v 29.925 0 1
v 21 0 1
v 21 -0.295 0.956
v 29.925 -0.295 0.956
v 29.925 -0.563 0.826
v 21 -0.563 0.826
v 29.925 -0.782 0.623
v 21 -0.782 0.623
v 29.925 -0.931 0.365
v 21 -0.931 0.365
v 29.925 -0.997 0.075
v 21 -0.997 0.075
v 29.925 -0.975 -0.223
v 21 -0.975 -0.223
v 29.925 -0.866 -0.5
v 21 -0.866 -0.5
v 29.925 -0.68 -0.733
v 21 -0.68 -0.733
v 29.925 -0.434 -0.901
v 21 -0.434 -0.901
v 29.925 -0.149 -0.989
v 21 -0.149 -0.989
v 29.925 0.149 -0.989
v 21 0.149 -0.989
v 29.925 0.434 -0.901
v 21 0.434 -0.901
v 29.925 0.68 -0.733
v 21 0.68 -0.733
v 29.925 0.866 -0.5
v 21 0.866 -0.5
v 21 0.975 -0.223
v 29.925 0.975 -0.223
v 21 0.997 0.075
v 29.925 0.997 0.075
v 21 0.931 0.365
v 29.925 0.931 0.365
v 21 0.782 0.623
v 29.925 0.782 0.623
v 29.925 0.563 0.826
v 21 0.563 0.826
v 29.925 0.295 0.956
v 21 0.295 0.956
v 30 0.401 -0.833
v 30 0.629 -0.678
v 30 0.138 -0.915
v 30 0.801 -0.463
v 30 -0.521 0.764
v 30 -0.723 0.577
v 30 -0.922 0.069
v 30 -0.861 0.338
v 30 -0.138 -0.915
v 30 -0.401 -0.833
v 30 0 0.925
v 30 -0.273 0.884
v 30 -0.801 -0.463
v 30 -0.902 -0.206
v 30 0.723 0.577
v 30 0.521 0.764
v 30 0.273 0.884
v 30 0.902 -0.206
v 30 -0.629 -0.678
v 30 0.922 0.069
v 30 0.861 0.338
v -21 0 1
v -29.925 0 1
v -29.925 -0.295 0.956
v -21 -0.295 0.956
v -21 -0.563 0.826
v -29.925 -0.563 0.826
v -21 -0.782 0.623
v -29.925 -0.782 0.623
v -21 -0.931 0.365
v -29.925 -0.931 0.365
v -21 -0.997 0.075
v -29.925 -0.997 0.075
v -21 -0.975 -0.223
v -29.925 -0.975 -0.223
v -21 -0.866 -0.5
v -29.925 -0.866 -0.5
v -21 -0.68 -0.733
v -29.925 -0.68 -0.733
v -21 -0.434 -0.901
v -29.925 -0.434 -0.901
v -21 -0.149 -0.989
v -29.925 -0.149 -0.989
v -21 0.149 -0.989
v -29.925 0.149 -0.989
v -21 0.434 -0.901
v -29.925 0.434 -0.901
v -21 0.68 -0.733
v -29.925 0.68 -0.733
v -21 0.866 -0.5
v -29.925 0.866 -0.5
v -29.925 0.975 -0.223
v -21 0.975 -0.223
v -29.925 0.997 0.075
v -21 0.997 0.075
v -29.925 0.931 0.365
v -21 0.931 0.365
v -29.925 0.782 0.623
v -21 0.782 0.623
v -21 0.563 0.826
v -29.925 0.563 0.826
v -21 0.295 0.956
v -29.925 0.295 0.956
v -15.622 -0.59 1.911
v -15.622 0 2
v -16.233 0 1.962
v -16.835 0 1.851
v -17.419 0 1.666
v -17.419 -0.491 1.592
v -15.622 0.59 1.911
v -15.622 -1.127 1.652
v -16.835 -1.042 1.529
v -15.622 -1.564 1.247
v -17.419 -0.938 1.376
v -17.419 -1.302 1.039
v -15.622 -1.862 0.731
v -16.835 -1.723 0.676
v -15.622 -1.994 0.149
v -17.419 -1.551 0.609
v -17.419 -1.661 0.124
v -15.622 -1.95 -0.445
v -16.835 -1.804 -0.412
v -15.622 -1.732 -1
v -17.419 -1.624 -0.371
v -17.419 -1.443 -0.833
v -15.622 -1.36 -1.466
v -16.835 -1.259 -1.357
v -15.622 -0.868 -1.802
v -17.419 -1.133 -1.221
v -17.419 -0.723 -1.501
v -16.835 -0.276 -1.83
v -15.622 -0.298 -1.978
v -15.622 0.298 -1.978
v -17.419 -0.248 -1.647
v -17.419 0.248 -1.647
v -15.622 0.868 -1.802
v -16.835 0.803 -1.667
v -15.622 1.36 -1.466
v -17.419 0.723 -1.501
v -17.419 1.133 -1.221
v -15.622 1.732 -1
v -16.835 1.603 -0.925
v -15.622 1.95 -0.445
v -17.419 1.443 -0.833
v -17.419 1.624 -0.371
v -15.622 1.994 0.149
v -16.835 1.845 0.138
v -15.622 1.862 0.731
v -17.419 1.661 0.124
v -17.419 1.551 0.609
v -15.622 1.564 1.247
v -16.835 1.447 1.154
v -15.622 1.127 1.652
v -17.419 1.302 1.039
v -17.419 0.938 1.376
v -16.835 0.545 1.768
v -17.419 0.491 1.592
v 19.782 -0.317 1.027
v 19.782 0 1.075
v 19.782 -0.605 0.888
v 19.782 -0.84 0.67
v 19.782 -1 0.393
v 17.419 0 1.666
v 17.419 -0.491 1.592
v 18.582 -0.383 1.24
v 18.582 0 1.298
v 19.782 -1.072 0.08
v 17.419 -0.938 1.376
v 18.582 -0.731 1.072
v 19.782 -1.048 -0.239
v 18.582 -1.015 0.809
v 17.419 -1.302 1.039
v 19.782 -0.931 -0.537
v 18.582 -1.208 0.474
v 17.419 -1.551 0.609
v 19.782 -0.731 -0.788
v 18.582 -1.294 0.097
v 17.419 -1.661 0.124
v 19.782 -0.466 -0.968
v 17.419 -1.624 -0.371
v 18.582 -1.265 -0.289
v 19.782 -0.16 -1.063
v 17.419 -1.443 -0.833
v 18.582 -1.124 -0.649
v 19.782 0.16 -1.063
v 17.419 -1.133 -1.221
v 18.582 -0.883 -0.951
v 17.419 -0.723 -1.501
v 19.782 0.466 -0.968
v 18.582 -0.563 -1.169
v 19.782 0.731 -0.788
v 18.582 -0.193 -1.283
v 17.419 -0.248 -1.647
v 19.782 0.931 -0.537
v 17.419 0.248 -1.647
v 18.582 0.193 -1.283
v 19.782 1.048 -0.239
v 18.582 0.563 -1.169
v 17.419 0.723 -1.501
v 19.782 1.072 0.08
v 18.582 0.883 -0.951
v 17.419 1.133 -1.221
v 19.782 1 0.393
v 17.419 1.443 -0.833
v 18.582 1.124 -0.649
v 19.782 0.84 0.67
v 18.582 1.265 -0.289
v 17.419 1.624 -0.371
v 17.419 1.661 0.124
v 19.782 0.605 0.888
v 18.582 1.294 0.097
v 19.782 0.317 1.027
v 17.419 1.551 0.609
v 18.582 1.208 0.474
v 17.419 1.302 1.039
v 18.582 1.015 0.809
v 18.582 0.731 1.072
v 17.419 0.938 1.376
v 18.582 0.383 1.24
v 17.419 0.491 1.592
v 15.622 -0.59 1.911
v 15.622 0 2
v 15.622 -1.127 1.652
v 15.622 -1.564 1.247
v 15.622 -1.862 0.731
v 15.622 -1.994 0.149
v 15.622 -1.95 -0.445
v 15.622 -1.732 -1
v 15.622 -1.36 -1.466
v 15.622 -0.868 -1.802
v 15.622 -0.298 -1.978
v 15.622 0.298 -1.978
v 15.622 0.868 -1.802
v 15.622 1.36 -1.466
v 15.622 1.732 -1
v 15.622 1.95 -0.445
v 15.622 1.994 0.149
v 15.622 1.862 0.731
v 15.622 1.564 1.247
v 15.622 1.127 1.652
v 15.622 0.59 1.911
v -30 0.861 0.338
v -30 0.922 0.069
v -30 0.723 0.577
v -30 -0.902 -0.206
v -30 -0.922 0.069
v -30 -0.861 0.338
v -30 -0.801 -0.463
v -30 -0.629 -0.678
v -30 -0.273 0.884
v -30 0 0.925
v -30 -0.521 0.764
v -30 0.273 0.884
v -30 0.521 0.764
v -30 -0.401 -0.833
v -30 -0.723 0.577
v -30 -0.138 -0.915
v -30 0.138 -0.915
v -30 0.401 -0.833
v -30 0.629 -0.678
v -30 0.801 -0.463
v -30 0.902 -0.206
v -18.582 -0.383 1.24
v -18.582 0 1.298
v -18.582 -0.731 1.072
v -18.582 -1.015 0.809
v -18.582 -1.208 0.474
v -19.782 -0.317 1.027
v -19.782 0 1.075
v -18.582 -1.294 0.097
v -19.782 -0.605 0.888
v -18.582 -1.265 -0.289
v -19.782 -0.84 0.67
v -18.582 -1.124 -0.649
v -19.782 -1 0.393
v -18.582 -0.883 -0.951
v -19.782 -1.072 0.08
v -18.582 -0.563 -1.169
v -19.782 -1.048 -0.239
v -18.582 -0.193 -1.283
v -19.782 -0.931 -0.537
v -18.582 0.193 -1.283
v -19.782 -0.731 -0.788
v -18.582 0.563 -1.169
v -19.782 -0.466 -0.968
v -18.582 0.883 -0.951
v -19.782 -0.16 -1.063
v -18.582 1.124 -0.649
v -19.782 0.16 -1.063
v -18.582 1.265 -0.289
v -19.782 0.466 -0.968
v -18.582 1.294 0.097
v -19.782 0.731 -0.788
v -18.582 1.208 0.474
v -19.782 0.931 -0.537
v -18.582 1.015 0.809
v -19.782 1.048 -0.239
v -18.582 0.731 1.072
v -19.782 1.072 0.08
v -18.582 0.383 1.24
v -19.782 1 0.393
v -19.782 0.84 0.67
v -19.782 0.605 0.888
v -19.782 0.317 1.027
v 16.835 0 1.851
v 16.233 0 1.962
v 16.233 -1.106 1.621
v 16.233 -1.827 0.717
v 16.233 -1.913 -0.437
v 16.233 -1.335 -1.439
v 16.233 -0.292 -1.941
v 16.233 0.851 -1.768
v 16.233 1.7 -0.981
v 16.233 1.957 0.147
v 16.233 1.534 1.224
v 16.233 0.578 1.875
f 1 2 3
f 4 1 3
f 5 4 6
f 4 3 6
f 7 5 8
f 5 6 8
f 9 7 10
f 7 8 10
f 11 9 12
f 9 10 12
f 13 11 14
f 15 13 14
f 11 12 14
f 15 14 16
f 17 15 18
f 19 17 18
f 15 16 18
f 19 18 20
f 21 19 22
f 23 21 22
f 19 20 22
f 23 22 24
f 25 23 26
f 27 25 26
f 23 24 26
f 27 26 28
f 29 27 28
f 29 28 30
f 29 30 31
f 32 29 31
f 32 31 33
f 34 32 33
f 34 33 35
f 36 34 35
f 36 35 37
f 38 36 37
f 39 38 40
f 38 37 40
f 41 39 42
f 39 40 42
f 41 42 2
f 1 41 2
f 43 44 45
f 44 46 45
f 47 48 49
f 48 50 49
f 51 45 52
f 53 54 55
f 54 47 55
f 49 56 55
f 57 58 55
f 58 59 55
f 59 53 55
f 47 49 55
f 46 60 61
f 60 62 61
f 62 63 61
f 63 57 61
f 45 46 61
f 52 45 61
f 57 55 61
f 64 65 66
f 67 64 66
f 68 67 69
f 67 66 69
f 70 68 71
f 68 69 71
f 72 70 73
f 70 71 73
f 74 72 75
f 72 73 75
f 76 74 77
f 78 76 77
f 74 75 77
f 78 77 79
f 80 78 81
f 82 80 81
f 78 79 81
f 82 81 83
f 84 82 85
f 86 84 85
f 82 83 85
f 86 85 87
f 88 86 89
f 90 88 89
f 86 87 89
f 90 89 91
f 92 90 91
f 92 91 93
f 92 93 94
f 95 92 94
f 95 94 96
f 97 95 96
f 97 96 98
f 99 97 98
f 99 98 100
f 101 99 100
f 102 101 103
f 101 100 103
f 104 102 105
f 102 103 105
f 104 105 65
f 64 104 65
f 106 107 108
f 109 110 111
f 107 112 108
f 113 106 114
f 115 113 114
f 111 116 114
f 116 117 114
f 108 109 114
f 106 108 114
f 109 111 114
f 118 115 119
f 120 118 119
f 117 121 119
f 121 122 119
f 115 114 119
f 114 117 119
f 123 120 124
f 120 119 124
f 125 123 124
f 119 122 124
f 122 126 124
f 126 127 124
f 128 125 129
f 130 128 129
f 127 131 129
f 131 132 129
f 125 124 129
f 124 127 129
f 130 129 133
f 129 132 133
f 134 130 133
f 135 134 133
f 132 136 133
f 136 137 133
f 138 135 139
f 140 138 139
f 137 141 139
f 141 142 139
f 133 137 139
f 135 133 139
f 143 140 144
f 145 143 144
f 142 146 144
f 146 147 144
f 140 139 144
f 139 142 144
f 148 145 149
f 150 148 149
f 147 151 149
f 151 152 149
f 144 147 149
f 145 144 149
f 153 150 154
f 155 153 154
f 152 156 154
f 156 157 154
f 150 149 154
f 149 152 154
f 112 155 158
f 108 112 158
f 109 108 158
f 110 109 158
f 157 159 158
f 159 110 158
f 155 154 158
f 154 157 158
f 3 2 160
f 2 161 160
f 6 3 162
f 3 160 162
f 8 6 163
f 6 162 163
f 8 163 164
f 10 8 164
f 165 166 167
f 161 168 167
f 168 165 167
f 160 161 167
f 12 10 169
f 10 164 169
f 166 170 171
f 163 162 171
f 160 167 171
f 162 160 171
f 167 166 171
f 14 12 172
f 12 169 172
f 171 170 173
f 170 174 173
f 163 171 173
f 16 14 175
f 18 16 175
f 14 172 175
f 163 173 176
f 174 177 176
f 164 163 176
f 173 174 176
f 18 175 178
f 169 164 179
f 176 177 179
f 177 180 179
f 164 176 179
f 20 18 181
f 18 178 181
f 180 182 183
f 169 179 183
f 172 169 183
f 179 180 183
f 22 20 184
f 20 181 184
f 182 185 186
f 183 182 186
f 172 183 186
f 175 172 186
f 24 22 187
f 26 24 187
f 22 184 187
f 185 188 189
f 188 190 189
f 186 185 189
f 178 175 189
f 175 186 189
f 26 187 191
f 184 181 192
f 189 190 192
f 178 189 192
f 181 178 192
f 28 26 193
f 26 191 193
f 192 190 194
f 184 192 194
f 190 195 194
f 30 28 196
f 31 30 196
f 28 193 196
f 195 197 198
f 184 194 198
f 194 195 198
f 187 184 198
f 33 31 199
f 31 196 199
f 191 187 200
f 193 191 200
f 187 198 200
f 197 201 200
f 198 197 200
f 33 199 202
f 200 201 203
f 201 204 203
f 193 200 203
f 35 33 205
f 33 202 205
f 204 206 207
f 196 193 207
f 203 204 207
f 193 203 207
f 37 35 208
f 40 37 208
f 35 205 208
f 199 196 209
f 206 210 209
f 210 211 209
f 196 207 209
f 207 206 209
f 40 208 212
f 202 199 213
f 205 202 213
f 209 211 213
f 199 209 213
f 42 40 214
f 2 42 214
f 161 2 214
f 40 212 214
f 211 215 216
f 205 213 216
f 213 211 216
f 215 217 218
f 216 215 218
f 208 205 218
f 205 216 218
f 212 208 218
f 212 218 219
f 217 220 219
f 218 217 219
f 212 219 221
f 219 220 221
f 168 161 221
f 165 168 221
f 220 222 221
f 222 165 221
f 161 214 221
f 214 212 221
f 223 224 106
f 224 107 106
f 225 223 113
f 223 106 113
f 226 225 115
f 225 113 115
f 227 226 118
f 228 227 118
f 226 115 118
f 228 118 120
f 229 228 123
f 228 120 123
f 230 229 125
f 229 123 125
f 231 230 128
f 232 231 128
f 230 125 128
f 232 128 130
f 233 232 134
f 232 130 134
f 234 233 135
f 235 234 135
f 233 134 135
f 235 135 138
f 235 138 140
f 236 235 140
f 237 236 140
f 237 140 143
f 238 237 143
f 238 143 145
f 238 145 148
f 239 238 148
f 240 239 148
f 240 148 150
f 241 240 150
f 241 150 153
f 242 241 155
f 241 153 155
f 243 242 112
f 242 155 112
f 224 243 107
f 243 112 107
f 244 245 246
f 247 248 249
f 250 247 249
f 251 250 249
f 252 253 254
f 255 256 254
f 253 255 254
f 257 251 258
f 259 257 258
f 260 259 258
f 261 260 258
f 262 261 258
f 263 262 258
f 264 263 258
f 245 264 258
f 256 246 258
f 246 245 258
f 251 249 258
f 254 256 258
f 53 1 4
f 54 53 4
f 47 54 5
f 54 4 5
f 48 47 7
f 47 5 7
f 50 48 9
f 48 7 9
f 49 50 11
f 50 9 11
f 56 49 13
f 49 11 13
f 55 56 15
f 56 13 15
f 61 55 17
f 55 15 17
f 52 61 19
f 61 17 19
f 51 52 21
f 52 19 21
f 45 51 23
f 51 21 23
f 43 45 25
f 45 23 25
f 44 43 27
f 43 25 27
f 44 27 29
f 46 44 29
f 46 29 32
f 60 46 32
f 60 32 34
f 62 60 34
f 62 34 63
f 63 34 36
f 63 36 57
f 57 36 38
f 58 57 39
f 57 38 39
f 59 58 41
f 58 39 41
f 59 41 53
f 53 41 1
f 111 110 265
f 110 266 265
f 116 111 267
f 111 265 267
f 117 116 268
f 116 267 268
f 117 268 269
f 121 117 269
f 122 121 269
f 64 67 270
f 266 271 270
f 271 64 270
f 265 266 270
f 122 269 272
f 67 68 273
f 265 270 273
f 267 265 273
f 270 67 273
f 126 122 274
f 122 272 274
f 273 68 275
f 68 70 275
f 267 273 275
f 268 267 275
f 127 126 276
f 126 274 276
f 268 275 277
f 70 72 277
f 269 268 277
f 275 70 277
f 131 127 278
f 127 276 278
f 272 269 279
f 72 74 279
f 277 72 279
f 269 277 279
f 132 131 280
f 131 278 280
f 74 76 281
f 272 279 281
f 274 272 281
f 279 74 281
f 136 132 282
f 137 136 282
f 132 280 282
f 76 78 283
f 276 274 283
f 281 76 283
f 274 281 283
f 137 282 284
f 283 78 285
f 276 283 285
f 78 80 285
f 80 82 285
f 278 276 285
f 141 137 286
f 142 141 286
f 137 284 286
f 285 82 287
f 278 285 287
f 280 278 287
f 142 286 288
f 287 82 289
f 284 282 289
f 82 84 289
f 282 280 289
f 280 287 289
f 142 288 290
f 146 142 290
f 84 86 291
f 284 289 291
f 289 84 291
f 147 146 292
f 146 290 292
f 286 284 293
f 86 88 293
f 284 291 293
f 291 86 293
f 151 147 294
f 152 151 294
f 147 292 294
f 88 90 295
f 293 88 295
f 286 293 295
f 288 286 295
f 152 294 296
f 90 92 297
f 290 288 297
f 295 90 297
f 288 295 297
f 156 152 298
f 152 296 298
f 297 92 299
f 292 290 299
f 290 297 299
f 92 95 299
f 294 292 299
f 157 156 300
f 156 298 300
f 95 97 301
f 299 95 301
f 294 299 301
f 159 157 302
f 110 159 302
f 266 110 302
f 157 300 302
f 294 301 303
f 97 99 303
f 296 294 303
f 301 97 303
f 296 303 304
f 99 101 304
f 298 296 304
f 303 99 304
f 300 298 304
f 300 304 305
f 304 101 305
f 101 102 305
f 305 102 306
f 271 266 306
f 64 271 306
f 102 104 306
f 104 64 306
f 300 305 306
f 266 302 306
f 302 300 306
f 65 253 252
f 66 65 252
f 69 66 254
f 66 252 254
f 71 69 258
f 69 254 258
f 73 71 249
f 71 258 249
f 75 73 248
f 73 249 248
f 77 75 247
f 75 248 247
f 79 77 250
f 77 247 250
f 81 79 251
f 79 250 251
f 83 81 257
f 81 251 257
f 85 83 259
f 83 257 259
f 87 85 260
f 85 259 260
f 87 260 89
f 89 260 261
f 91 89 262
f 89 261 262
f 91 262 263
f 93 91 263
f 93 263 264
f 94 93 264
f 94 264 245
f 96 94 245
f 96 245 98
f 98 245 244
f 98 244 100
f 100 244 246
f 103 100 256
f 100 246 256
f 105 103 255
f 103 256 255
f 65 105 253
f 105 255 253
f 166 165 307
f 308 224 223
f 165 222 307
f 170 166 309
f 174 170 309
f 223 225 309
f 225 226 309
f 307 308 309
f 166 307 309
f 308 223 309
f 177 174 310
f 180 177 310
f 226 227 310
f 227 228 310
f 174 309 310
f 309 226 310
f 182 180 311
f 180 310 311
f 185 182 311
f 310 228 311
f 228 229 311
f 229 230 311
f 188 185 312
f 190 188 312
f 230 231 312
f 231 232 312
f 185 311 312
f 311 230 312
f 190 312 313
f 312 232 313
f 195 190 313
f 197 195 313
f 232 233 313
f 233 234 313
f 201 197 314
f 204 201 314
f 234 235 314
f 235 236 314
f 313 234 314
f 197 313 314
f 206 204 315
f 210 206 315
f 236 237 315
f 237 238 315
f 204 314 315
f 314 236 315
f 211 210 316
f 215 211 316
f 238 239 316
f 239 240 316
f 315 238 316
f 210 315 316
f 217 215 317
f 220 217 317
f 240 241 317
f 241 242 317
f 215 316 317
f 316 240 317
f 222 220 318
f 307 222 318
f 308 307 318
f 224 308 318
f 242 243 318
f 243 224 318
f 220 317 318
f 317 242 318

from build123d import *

# Parameters (mm, degrees)
CHAMFER1_SIZE = 0.075


with BuildPart() as part:
    # Sketch1 → Revolve1 (revolve)
    with BuildSketch(Plane(origin=(0, 0, 0), x_dir=(1, 0, 0), z_dir=(0, 1, 0)), mode=Mode.PRIVATE) as revolve1_sk:
        with BuildLine():
            Line((-30, 0), (30, 0))
            Line((30, 0), (30, 1))
            Line((30, 1), (21, 1))
            ThreePointArc((21, 1), (19.178802434, 1.167873273), (17.418979879, 1.665835704))
            ThreePointArc((17.418979879, 1.665835704), (16.535774215, 1.915749105), (15.621766151, 2))
            Line((15.621766151, 2), (-15.621766151, 2))
            ThreePointArc((-15.621766151, 2), (-16.535774215, 1.915749105), (-17.418979879, 1.665835704))
            ThreePointArc((-17.418979879, 1.665835704), (-19.178802434, 1.167873273), (-21, 1))
            Line((-21, 1), (-30, 1))
            Line((-30, 1), (-30, 0))
        make_face()
    revolve(revolve1_sk.sketch.rotate(Axis((-30, 0, 0), (1, 0, 0)), 180), axis=Axis((-30, 0, 0), (1, 0, 0)))

    # Chamfer1
    chamfer1_edges = [part.edges().sort_by_distance(p)[0] for p in [
        (30, 0, -1),
        (-30, 0, -1),
    ]]
    chamfer(chamfer1_edges, length=CHAMFER1_SIZE)


solid = part.part
